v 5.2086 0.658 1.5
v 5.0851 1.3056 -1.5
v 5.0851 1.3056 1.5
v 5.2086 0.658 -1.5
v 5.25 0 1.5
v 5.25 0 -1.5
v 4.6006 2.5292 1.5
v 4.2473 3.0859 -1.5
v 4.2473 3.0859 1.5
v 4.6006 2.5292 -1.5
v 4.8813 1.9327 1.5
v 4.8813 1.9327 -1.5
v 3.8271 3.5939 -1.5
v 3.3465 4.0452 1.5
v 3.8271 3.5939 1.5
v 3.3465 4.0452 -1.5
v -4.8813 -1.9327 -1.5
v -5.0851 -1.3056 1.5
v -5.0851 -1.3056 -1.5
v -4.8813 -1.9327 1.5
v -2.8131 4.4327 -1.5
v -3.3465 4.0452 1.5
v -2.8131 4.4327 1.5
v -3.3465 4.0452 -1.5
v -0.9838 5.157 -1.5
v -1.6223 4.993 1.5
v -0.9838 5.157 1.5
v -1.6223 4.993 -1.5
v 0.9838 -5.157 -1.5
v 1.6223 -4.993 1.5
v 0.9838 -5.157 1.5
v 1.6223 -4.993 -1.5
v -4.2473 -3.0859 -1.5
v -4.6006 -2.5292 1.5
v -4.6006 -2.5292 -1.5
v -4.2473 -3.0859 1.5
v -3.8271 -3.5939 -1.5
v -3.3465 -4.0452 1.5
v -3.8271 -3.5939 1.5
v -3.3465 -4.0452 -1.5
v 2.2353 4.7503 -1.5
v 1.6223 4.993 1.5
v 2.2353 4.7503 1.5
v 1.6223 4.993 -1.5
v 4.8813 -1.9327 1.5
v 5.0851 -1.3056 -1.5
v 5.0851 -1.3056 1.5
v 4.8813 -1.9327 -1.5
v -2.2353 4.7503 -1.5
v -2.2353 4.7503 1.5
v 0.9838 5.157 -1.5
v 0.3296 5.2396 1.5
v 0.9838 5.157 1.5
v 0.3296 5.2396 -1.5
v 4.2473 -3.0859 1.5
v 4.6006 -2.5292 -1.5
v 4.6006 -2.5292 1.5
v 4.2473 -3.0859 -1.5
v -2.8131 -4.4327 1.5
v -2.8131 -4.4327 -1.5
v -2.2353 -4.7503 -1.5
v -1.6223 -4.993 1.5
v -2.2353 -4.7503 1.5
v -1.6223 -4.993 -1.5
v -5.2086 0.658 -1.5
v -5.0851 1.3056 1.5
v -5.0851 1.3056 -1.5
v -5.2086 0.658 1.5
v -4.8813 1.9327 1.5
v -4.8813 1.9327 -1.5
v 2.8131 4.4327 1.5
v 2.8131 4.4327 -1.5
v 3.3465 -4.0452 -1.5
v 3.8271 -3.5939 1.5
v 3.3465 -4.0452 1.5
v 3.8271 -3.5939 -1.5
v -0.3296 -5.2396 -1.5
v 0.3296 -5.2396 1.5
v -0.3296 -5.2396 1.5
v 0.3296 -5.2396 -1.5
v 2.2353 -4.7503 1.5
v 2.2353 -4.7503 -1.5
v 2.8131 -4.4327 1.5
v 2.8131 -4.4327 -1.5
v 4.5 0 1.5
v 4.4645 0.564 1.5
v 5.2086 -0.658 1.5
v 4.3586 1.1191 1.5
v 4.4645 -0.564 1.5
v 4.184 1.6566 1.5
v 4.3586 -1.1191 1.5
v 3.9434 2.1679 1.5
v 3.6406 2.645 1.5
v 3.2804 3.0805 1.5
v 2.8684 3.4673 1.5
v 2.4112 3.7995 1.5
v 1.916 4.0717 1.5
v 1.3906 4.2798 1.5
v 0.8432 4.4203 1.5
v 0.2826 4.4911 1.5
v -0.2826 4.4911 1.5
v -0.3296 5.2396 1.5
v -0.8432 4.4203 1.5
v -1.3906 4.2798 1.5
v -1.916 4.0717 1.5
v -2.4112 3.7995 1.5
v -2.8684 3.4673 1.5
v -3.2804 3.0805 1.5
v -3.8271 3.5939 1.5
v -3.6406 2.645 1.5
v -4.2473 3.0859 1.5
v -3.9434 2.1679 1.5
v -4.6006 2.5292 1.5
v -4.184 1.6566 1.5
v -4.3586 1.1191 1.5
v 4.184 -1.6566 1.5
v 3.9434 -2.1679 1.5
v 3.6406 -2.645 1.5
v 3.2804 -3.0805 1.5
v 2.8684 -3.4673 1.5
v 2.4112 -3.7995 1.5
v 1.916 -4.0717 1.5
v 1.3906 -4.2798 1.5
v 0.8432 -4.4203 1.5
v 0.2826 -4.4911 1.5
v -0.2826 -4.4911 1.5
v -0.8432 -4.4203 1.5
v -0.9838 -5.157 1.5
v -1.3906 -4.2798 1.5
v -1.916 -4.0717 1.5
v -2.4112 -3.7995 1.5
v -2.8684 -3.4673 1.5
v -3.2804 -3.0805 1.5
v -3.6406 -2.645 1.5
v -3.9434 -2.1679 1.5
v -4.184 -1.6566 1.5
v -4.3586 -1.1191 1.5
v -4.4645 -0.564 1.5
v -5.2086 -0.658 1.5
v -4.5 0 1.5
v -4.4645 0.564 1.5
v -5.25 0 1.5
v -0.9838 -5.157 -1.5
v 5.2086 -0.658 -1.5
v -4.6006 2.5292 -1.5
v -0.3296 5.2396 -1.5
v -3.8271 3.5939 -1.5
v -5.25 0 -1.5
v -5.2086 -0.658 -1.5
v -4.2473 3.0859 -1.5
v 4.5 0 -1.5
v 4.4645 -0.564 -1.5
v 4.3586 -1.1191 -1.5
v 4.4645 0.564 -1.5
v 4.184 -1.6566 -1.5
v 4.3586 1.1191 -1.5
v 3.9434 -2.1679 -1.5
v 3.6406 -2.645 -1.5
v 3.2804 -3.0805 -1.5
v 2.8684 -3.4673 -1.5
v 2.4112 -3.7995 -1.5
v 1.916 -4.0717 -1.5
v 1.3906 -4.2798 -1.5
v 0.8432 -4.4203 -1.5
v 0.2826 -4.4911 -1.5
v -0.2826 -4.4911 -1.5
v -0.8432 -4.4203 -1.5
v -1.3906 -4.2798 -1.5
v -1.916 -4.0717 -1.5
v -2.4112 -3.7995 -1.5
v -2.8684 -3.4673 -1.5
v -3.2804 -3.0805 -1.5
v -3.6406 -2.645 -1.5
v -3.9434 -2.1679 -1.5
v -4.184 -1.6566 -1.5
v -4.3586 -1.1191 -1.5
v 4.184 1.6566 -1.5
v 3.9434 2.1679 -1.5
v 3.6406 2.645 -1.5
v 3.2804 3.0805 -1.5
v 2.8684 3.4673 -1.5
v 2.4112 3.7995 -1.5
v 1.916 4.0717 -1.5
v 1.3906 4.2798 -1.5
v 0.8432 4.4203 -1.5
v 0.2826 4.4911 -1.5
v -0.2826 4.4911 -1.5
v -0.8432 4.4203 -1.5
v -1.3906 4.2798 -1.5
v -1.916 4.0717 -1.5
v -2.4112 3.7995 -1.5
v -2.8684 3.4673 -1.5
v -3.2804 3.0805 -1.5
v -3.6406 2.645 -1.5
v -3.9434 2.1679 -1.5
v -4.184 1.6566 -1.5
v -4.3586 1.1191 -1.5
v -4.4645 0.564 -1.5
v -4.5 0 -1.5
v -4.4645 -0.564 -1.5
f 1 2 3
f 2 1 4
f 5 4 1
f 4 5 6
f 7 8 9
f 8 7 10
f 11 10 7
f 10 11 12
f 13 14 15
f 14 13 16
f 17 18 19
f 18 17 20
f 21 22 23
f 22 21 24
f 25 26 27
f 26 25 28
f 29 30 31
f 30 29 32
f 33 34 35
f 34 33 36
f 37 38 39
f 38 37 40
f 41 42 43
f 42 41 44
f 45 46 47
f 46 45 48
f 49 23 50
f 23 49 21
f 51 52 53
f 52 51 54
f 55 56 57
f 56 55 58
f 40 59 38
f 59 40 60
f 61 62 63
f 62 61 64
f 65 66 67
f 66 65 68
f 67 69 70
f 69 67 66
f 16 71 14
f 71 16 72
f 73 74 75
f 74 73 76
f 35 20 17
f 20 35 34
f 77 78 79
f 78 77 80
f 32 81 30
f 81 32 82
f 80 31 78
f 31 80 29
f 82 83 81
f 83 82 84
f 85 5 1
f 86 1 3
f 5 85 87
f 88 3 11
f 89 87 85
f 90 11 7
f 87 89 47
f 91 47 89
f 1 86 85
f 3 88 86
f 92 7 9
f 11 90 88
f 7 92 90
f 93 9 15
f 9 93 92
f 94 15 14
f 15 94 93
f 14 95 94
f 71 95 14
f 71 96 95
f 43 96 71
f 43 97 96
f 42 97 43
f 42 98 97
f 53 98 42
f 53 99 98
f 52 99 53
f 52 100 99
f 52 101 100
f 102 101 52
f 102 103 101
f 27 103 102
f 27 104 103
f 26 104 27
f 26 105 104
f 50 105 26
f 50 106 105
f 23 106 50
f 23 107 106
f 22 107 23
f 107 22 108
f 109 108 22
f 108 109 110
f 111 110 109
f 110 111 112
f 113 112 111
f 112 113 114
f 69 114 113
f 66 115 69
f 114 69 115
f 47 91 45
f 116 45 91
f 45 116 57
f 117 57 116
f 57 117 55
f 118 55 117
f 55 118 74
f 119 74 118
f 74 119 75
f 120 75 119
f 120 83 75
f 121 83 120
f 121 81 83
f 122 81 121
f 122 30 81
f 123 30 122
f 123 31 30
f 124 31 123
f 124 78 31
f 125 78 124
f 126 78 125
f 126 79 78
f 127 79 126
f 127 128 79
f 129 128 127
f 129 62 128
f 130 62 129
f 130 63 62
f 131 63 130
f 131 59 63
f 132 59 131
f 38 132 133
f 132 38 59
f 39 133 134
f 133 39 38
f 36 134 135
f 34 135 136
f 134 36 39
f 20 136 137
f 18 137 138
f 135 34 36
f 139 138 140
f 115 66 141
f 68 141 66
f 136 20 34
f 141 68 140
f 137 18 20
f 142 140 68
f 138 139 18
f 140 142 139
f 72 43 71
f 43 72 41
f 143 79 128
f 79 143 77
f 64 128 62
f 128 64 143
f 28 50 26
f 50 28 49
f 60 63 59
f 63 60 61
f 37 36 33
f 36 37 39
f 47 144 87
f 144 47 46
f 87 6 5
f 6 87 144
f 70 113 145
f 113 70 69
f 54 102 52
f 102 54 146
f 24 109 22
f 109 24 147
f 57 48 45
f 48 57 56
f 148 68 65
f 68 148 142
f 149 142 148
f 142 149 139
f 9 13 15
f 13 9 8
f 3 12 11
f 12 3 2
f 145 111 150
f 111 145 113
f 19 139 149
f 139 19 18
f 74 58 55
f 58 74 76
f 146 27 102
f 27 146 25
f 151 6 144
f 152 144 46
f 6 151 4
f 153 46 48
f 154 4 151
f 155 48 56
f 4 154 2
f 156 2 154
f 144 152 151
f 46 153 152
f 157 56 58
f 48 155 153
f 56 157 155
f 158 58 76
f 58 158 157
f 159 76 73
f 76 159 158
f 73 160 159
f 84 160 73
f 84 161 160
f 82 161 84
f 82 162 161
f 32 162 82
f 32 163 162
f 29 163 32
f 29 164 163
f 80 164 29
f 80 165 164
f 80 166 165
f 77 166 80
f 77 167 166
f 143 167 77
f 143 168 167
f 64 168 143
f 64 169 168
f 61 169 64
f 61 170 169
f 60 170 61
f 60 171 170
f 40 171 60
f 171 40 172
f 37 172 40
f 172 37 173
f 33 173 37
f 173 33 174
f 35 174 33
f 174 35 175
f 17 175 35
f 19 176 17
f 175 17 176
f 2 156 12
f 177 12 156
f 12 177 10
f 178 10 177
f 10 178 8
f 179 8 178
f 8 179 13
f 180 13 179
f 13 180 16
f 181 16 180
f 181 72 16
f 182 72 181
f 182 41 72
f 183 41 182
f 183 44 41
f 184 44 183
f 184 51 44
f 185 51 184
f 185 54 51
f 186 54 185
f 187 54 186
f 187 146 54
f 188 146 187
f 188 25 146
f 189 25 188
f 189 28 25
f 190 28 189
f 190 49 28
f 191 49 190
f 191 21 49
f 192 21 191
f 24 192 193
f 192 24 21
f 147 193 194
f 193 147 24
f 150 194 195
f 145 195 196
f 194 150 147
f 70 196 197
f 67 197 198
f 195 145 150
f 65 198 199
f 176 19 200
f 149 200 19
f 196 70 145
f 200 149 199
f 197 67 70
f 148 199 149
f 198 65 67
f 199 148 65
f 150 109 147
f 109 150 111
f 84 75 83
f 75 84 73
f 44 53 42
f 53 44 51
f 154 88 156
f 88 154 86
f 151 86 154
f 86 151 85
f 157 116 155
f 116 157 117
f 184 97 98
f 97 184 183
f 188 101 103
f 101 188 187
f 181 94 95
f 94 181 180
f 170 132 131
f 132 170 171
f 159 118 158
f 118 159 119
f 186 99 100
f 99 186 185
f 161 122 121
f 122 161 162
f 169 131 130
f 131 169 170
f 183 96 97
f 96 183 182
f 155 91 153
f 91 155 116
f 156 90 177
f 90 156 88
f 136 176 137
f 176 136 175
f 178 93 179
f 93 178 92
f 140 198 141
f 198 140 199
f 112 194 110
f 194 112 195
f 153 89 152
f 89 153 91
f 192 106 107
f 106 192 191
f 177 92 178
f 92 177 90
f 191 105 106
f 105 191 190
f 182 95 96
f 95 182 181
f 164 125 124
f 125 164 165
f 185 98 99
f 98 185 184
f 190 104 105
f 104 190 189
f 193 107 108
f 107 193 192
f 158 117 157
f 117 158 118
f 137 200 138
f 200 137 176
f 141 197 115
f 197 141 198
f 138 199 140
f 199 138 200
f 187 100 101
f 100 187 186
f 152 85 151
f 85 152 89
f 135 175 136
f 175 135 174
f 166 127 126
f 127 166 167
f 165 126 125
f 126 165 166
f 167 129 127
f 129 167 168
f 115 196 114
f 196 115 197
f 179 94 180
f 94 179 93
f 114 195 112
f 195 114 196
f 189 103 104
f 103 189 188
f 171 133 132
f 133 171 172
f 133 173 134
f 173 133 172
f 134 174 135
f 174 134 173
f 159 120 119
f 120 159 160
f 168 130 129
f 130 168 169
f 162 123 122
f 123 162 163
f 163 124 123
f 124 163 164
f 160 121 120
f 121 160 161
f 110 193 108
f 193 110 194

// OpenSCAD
$fn = 50;


difference() {
	union() {
		translate(v = [0, 0, -1.5000000000]) {
			cylinder(h = 3, r = 5.2500000000);
		}
	}
	union() {
		translate(v = [0, 0, -100.0000000000]) {
			cylinder(h = 200, r = 4.5000000000);
		}
	}
}
